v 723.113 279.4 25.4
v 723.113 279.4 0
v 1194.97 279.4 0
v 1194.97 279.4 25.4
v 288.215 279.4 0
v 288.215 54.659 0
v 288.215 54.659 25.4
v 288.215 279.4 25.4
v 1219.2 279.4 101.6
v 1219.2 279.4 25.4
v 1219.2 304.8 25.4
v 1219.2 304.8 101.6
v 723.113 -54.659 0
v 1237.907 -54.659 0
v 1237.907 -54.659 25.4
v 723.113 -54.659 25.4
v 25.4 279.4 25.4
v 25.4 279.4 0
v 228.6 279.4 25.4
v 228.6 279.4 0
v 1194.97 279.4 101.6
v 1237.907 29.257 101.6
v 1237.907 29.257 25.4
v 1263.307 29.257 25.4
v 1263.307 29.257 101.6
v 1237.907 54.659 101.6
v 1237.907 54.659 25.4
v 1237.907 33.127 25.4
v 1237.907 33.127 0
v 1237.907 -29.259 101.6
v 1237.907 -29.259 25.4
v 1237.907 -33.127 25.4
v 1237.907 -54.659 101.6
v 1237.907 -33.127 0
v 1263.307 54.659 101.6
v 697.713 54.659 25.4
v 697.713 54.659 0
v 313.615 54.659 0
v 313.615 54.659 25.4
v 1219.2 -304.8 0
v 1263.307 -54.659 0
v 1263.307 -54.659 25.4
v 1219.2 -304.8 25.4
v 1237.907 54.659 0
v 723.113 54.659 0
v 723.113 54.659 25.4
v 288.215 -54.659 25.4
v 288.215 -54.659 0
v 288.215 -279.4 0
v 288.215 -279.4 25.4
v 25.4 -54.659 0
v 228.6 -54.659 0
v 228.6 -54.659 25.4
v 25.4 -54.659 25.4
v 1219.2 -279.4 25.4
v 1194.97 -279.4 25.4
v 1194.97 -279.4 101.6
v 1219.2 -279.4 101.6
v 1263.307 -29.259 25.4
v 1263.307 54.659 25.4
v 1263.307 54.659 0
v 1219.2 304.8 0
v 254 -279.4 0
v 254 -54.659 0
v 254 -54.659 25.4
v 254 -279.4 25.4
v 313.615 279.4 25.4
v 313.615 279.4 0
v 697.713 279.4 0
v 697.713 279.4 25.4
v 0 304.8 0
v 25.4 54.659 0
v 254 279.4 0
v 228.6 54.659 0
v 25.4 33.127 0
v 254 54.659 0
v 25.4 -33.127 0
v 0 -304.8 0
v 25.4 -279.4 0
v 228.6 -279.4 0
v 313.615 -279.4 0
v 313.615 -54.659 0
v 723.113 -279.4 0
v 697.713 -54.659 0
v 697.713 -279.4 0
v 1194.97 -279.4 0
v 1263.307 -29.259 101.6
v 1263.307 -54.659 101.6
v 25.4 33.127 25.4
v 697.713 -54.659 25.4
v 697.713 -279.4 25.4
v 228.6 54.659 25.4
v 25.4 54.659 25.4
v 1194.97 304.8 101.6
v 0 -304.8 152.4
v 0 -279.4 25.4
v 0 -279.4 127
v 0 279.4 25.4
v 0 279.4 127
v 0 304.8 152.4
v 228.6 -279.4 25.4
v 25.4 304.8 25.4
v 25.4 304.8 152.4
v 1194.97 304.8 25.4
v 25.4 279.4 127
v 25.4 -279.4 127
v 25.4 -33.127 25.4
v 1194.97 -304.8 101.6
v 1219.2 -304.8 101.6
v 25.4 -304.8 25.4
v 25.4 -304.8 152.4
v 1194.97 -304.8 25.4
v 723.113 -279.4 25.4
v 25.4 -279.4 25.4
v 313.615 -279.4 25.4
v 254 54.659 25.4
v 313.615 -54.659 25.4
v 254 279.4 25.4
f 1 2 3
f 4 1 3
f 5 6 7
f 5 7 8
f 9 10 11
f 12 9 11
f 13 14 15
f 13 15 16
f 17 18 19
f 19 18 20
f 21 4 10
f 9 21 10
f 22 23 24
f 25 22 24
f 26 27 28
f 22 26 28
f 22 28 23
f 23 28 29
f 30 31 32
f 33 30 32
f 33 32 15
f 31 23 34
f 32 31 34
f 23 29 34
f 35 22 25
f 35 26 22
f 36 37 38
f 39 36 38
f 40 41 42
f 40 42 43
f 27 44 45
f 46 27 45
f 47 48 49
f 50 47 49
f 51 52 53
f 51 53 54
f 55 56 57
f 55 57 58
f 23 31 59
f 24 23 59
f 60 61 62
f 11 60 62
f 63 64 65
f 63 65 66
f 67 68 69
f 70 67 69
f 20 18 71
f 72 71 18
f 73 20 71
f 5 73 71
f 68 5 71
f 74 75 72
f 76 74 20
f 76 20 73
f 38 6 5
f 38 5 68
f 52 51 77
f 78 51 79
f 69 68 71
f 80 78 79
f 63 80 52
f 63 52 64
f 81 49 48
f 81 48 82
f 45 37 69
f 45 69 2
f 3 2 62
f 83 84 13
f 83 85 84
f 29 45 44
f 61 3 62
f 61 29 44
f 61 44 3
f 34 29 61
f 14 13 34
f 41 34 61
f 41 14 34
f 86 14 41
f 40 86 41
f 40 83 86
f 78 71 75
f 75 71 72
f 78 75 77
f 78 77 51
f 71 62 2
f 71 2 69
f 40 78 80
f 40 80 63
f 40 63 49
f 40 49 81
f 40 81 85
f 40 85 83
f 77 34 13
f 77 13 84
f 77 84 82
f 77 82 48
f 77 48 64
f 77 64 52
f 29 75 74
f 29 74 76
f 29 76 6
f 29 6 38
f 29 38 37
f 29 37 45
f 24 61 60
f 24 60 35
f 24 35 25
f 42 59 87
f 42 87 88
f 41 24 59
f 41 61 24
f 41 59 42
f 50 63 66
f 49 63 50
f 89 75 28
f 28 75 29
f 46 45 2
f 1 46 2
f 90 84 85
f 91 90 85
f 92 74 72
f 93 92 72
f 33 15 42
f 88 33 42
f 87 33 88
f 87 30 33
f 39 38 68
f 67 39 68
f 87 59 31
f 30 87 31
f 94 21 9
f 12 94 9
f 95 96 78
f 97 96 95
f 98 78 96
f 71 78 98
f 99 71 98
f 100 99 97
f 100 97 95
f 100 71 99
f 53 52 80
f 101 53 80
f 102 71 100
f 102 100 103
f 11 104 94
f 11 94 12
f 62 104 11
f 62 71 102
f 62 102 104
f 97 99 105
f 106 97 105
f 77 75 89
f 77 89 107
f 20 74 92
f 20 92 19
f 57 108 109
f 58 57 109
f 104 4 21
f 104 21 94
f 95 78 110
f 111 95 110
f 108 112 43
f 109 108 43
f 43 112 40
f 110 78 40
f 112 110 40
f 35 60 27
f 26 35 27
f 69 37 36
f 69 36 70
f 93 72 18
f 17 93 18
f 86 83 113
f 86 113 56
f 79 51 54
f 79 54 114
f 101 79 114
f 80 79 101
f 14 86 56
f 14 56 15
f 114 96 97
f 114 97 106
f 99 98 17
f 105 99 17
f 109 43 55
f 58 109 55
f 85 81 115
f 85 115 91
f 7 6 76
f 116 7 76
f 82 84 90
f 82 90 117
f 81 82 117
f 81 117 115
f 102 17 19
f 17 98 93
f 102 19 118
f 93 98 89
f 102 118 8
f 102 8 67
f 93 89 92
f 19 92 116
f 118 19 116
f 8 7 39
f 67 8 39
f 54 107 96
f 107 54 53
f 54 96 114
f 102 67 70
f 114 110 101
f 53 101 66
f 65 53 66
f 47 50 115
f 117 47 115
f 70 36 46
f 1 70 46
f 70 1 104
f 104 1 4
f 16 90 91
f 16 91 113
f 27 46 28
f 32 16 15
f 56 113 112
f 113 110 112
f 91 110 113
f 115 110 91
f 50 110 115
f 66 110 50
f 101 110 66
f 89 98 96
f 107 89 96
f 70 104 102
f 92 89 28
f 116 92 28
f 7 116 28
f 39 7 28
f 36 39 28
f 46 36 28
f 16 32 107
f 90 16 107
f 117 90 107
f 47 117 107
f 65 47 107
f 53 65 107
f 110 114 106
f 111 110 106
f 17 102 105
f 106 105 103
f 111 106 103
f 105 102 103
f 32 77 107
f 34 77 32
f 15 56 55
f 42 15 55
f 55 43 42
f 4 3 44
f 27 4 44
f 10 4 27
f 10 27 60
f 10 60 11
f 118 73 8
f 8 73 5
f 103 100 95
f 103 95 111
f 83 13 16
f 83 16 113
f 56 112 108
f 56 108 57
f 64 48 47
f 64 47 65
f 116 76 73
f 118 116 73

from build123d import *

# Parameters (mm, degrees)
F0_W     = 25.4
F0_H     = 224.7411692651
F1_DEPTH = 25.4
F3_W     = 24.2299882889
F3_H     = 25.4
F4_DEPTH = 76.2
F5_W     = 25.4
F5_H     = 25.4
F6_DEPTH = 127
F7_W     = 25.4
F7_H     = 25.4
F8_DEPTH = 573.024


with BuildPart() as f1:
    # F0 (on Top) → F1 (new body)
    with BuildSketch(Plane.XY):
        Polygon((0, 304.8), (0, 0), (25.4, 0), (25.4, 33.1274457276), (25.4, 54.6588307349), (25.4, 279.4), (228.6, 279.4), (254, 279.4), (288.2145345211, 279.4), (313.6145345211, 279.4), (697.7127194405, 279.4), (723.1127194405, 279.4), (1194.9700117111, 279.4), (1237.9066371274, 54.6588307349), (1237.9066371274, 33.1274457276), (1237.9066371274, 0), (1263.3066371274, 0), (1263.3066371274, 54.6588307349), (1219.2, 304.8), align=None)
        Polygon((25.4, 54.6588307349), (25.4, 33.1274457276), (1237.9066371274, 33.1274457276), (1237.9066371274, 54.6588307349), (723.1127194405, 54.6588307349), (697.7127194405, 54.6588307349), (313.6145345211, 54.6588307349), (288.2145345211, 54.6588307349), (254, 54.6588307349), (228.6, 54.6588307349), align=None)
        with Locations((241.3, 167.0294153674)):
            Rectangle(F0_W, F0_H)
        with Locations((300.9145345211, 167.0294153674)):
            Rectangle(F0_W, F0_H)
        with Locations((710.4127194405, 167.0294153674)):
            Rectangle(F0_W, F0_H)
    extrude(amount=F1_DEPTH)

    # F2: F1 across plane


with BuildPart() as f1_1:
    add(f1.part)
    add(f1.part.mirror(Plane.XZ))

    # F3 (on face) → F4 (join)
    with BuildSketch(Plane.XY.offset(25.4)):
        with Locations((1207.0850058556, -292.1)):
            Rectangle(F3_W, F3_H)
        Polygon((1237.9066371274, -54.6588307349), (1263.3066371274, -54.6588307349), (1263.3066371274, -29.2588307349), (1237.9066371274, -29.2588307349), (1237.9066371274, -33.1274457276), align=None)
        Polygon((1237.9066371274, 29.2572733015), (1263.3066371274, 29.2572733015), (1263.3066371274, 54.6588307349), (1237.9066371274, 54.6588307349), (1237.9066371274, 33.1274457276), align=None)
        with Locations((1207.0850058556, 292.1)):
            Rectangle(F3_W, F3_H)
    extrude(amount=F4_DEPTH)

    # F5 (on face) → F6 (join)
    with BuildSketch(Plane.XY.offset(25.4)):
        with Locations((12.7, 292.1)):
            Rectangle(F5_W, F5_H)
        with Locations((12.7, -292.1)):
            Rectangle(F5_W, F5_H)
    extrude(amount=F6_DEPTH)

    # F7 (on face) → F8 (join)
    with BuildSketch(Plane.XZ.offset(-279.4)):
        with Locations((12.7, 139.7)):
            Rectangle(F7_W, F7_H)
    extrude(amount=F8_DEPTH)


solid = f1_1.part
